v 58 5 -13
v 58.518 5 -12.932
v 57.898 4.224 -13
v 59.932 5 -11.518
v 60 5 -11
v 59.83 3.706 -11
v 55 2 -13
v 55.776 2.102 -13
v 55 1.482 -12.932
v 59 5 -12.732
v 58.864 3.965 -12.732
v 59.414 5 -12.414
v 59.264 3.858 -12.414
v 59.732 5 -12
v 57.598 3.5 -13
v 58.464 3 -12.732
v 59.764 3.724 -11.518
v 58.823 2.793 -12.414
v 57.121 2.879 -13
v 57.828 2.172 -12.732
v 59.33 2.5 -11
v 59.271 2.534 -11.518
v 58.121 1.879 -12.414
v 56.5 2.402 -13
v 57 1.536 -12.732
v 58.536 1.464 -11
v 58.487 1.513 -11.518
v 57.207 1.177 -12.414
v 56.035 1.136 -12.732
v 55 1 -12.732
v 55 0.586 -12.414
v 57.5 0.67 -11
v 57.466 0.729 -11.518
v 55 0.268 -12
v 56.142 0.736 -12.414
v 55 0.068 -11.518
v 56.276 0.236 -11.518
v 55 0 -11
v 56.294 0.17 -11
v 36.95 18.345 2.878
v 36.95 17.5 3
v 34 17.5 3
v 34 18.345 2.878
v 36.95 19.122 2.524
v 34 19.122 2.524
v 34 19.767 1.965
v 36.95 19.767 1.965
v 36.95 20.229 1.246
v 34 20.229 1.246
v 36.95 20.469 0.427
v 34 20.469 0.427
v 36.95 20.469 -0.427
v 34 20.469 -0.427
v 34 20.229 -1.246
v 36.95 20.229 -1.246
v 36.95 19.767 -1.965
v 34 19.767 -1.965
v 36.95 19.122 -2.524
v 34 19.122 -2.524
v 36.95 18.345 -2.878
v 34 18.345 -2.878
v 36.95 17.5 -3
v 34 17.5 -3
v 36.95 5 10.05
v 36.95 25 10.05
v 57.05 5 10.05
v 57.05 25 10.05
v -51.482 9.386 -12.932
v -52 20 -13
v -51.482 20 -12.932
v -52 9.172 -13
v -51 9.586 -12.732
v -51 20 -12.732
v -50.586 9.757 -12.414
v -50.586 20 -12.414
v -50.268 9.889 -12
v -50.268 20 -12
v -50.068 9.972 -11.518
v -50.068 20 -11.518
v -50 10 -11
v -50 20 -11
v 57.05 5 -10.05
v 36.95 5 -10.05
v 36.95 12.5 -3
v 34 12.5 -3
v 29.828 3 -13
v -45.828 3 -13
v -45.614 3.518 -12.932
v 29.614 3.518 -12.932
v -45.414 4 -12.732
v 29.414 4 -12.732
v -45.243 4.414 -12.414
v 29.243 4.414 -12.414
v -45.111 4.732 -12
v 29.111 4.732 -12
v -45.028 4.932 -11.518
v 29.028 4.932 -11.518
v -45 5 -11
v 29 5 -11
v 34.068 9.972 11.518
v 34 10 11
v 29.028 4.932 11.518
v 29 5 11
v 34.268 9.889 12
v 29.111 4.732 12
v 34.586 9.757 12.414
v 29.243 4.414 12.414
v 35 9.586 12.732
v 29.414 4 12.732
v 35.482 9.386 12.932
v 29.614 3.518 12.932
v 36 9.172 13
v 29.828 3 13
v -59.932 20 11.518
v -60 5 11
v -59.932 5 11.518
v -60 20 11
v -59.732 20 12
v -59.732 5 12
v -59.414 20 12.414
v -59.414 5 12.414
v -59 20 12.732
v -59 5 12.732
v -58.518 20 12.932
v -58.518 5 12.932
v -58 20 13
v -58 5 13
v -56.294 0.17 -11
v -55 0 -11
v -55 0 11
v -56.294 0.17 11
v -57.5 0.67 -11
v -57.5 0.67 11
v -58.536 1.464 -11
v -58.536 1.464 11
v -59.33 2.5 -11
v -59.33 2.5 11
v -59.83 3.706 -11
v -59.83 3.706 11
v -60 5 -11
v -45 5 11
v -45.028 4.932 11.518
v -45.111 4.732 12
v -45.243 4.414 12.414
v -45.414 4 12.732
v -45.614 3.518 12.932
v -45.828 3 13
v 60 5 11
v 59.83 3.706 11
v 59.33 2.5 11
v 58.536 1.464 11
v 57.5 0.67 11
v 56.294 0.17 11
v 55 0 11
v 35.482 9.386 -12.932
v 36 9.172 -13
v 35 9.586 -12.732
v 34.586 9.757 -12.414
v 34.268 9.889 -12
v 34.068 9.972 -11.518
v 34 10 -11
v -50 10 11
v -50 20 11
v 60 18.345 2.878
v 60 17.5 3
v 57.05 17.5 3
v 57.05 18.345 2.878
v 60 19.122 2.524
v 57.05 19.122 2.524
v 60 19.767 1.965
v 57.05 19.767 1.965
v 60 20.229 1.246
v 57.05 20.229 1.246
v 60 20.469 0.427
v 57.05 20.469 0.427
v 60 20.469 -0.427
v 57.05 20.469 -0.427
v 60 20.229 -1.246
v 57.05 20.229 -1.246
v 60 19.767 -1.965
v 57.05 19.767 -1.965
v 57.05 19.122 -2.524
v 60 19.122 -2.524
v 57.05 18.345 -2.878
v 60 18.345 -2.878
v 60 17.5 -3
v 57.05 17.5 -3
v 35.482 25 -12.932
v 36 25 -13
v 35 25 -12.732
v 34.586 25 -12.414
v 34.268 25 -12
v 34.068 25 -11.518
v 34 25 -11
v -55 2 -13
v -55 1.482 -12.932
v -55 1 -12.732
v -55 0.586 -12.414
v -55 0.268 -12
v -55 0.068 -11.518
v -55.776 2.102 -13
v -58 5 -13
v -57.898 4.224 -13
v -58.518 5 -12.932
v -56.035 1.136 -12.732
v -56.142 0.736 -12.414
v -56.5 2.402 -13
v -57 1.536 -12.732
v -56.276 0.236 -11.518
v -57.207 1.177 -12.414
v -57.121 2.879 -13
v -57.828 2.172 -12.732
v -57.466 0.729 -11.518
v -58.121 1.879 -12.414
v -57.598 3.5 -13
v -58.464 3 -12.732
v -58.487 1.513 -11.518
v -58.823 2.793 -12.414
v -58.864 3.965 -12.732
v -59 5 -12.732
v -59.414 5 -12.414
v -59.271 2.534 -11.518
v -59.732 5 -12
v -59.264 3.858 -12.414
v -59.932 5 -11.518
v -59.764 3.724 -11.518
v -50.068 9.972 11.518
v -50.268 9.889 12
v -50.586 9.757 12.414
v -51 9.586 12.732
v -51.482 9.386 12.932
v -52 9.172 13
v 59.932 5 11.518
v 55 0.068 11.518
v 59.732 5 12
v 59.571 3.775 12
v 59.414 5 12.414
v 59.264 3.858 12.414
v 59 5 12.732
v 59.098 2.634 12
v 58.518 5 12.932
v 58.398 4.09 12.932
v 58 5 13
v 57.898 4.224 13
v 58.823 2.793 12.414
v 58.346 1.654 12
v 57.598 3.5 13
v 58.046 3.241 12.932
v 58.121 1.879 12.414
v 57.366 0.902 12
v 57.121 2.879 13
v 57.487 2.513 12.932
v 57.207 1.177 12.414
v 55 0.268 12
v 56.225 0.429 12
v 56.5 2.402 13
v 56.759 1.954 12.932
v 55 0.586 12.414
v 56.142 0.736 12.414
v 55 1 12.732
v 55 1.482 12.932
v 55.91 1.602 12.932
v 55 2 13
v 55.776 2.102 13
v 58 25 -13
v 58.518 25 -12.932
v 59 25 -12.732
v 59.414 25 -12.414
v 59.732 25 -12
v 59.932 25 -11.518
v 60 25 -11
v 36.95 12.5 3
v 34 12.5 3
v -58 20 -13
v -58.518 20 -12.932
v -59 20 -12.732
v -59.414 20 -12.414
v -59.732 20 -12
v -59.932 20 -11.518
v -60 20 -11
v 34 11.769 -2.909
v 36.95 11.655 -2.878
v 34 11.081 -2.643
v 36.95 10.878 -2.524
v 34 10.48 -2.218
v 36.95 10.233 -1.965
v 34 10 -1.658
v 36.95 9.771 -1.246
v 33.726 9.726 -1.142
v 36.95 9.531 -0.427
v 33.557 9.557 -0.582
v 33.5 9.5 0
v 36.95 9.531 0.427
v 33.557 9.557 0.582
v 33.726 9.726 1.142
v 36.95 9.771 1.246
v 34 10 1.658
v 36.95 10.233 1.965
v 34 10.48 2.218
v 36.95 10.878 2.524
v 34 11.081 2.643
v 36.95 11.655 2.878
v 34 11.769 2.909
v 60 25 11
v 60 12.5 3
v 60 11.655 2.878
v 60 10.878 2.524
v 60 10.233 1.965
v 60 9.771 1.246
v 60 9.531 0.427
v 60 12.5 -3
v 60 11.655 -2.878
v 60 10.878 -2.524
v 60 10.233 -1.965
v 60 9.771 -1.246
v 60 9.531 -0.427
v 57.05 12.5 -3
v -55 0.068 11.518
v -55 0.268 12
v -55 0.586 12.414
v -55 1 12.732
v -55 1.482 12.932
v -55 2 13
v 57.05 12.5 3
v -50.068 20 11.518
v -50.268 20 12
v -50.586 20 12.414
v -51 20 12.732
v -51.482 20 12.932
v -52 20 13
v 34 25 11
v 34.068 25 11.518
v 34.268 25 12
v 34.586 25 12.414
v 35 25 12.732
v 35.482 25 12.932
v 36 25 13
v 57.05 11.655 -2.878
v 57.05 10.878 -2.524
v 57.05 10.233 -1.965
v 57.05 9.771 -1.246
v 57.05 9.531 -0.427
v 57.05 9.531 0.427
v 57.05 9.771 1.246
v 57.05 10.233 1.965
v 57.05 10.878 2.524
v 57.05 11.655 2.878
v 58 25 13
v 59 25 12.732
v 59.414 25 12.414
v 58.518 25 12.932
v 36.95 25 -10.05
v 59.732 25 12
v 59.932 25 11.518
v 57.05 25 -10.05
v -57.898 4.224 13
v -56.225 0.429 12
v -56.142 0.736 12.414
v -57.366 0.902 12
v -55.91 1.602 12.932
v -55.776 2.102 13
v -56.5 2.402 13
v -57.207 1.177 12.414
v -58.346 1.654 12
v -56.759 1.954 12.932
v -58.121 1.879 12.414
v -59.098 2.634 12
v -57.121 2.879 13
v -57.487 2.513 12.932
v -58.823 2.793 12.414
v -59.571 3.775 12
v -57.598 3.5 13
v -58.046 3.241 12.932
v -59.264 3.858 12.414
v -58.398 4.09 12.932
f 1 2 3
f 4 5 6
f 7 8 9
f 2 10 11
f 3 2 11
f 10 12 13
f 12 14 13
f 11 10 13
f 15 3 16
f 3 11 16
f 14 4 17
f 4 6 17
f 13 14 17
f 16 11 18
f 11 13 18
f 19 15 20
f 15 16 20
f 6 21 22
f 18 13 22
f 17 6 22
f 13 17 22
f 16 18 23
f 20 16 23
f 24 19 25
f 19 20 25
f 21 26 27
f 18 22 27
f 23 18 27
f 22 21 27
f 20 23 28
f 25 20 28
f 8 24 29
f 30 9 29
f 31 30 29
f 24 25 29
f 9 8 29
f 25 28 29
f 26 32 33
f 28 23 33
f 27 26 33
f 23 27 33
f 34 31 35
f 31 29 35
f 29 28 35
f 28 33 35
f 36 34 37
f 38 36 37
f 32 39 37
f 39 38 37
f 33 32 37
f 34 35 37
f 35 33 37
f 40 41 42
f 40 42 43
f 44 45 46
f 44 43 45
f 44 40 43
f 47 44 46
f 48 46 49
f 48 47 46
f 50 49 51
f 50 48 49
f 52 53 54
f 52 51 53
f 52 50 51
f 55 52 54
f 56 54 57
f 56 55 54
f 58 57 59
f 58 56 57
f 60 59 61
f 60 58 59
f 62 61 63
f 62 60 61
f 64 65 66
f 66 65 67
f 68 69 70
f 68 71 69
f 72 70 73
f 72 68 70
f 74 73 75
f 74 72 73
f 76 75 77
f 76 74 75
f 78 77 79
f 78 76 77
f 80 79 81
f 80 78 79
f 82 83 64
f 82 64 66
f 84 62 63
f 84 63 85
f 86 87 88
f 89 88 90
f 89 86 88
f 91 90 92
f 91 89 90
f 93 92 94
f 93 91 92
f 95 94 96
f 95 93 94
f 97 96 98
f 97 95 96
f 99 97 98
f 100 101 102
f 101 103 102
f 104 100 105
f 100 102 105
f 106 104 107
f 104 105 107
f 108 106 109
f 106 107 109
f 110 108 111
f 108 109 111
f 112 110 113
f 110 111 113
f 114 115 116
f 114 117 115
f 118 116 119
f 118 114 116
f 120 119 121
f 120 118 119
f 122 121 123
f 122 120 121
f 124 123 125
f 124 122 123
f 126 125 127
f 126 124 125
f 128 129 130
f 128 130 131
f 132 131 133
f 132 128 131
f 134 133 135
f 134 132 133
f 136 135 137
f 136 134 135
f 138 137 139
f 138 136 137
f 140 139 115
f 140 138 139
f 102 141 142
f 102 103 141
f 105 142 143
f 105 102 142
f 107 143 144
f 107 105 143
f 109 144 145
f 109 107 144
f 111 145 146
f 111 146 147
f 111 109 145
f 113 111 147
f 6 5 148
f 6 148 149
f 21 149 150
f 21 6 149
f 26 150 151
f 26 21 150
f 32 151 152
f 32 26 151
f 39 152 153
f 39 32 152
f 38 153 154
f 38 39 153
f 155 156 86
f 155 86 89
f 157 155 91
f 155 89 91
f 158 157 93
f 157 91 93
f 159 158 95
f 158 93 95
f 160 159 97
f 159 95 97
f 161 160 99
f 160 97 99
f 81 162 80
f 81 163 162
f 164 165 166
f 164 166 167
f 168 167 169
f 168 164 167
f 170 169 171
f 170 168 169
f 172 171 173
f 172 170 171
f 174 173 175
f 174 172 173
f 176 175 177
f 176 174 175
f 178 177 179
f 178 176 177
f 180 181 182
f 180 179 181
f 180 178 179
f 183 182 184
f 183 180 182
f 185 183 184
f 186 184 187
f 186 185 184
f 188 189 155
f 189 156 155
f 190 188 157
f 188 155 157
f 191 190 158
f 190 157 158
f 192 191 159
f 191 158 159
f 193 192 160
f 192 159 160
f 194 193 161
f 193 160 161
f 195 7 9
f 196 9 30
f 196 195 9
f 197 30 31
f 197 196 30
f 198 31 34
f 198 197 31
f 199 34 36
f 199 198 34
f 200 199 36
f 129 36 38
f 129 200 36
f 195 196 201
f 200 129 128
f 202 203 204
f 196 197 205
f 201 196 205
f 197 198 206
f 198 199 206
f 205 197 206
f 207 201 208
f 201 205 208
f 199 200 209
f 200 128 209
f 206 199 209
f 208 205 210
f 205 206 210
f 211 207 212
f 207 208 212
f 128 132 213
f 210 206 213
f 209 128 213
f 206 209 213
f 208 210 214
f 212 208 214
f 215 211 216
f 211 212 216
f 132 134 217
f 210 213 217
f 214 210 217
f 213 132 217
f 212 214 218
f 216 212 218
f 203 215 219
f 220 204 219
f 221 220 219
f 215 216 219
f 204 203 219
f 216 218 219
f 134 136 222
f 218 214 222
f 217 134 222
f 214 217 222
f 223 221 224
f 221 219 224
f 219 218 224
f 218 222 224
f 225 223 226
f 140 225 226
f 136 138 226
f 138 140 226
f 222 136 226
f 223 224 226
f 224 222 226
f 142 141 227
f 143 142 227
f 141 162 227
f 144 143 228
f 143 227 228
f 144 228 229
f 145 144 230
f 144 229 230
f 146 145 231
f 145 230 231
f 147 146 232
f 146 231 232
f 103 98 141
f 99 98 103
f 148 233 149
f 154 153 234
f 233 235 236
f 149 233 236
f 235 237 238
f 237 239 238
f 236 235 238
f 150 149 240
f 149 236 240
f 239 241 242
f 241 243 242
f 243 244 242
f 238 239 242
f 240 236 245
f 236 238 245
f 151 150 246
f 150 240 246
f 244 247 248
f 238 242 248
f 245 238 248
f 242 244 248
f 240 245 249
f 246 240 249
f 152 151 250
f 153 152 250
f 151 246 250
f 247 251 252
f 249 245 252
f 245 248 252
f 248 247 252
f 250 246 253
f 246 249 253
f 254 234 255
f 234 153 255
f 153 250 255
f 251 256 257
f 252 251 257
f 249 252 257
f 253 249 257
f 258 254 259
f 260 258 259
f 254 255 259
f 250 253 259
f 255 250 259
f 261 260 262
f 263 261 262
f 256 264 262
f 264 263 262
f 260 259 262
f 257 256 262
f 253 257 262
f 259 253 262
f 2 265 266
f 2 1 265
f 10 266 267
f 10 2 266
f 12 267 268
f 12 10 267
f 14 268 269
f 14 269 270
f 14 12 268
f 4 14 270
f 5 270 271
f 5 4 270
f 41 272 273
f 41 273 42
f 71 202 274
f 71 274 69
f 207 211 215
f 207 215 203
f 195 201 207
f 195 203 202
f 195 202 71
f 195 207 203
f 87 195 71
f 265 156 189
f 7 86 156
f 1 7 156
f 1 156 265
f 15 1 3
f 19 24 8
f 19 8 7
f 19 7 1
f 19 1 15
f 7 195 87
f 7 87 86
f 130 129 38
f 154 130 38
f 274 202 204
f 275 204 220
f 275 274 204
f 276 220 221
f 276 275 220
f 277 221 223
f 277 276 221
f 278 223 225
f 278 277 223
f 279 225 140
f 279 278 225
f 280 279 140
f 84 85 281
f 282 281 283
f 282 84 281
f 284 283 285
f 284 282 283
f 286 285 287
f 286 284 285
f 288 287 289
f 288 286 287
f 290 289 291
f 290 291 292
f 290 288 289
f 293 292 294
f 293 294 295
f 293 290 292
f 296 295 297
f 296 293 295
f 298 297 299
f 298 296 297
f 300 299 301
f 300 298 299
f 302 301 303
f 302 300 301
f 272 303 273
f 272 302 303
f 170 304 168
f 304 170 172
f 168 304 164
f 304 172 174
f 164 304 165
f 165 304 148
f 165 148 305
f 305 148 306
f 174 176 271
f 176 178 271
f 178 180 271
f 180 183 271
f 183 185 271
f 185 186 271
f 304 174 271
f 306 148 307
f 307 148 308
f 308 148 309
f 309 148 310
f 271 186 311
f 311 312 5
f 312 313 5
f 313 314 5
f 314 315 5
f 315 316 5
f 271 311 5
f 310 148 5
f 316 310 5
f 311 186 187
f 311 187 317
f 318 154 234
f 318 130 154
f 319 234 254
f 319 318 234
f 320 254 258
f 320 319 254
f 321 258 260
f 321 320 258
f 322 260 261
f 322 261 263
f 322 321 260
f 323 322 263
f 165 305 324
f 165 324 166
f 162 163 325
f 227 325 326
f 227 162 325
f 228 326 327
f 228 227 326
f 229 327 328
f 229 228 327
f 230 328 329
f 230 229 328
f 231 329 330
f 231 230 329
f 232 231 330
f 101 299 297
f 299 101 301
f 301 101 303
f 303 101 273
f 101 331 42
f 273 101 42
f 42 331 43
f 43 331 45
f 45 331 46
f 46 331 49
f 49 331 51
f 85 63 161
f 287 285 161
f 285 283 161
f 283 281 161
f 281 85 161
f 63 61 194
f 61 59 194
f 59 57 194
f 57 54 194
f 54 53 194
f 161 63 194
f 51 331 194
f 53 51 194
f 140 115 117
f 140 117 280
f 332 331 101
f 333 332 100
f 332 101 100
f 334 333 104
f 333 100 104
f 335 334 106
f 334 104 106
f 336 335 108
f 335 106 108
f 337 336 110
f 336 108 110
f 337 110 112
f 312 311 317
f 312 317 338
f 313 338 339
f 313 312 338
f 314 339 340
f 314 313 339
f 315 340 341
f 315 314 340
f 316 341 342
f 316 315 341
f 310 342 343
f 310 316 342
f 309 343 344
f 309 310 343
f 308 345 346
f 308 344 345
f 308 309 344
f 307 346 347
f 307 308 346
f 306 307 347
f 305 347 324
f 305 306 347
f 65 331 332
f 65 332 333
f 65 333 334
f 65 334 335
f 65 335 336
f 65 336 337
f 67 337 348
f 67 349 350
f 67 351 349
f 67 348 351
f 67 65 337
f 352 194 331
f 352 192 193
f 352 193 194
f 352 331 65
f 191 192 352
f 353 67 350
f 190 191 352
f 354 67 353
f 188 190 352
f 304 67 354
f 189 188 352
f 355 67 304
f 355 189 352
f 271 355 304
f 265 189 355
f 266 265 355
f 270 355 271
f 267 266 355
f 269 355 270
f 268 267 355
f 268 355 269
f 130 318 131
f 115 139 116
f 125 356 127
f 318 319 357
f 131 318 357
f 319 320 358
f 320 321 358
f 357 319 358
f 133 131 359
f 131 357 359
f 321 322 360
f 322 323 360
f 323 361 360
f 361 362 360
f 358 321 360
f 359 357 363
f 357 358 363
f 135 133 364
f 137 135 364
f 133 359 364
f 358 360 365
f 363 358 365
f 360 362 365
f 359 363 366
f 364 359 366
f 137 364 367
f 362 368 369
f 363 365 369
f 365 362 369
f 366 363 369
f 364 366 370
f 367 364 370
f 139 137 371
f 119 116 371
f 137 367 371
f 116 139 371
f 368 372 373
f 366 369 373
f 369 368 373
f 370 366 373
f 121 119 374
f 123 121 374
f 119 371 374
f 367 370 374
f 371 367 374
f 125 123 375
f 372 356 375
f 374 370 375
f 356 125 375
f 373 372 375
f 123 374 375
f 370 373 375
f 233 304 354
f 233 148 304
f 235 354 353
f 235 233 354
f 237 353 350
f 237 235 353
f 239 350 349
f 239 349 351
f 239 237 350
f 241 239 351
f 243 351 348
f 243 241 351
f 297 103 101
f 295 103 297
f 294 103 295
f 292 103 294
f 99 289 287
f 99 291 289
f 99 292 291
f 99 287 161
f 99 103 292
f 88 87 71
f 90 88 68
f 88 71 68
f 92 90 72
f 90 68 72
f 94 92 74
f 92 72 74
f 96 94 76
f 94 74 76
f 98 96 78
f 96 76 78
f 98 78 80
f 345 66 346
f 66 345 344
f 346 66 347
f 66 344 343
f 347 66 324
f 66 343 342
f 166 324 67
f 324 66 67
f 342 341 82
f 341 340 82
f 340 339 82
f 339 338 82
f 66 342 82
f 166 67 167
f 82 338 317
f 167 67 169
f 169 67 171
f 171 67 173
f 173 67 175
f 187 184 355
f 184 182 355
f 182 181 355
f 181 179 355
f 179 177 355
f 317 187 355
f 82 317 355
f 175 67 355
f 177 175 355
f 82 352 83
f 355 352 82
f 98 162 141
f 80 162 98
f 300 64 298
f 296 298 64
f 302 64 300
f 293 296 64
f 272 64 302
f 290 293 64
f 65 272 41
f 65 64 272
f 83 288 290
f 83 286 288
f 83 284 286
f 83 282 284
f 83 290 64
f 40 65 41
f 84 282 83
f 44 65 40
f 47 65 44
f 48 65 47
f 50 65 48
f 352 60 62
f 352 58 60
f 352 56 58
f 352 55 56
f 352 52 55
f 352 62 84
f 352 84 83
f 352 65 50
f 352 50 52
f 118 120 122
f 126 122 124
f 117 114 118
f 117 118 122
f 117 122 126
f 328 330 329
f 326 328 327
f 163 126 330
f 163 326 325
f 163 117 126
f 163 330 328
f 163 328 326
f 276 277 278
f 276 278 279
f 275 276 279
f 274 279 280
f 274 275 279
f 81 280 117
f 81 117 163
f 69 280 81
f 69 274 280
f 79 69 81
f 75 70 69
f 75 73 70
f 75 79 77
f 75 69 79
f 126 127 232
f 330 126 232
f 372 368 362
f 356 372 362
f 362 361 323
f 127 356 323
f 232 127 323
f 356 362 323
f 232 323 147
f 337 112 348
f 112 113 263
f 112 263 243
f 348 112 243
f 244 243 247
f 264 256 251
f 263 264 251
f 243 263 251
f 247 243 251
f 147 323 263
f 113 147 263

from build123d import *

# Parameters (mm, degrees)
SKETCH1_W           = 120
SKETCH1_H           = 26
BOSS_EXTRUDE1_DEPTH = 25
SKETCH3_W           = 84
SKETCH3_H           = 26
CUT_EXTRUDE1_DEPTH  = 20
SKETCH4_W           = 10
SKETCH4_H           = 26
CUT_EXTRUDE2_DEPTH  = 5
CHAMFER1_SIZE       = 5
SKETCH5_W           = 20.1
SKETCH5_H           = 20.1
CUT_EXTRUDE3_DEPTH  = 20
FILLET1_R           = 5
FILLET2_R           = 2
CUT_EXTRUDE4_DEPTH  = 30


with BuildPart() as part:
    # Sketch1 → Boss-Extrude1 (new body)
    with BuildSketch(Plane(origin=(0, 0, 0), x_dir=(1, 0, 0), z_dir=(0, 1, 0))):
        Rectangle(SKETCH1_W, SKETCH1_H)
    extrude(amount=BOSS_EXTRUDE1_DEPTH)

    # Sketch3 → Cut-Extrude1 (cut)
    with BuildSketch(Plane(origin=(0, 25, 0), x_dir=(1, 0, 0), z_dir=(0, 1, 0))):
        with Locations((-8, 0)):
            Rectangle(SKETCH3_W, SKETCH3_H)
    extrude(amount=-CUT_EXTRUDE1_DEPTH, mode=Mode.SUBTRACT)

    # Sketch4 → Cut-Extrude2 (cut)
    with BuildSketch(Plane(origin=(0, 25, 0), x_dir=(1, 0, 0), z_dir=(0, 1, 0))):
        with Locations((-55, 0)):
            Rectangle(SKETCH4_W, SKETCH4_H)
    extrude(amount=-CUT_EXTRUDE2_DEPTH, mode=Mode.SUBTRACT)

    # Chamfer1
    chamfer1_edges = [part.edges().sort_by_distance(p)[0] for p in [
        (-50, 5, 0),
        (34, 5, 0),
    ]]
    chamfer(chamfer1_edges, length=CHAMFER1_SIZE)

    # Sketch5 → Cut-Extrude3 (cut)
    with BuildSketch(Plane(origin=(0, 25, 0), x_dir=(1, 0, 0), z_dir=(0, 1, 0))):
        with Locations((47, 0)):
            Rectangle(SKETCH5_W, SKETCH5_H)
    extrude(amount=-CUT_EXTRUDE3_DEPTH, mode=Mode.SUBTRACT)

    # Fillet1
    fillet1_edges = [part.edges().sort_by_distance(p)[0] for p in [
        (60, 0, 0),
        (-60, 0, 0),
    ]]
    fillet(fillet1_edges, radius=FILLET1_R)

    # Fillet2
    fillet2_edges = [part.edges().sort_by_distance(p)[0] for p in [
        (-60, 12.5, -13),
        (-60, 12.5, 13),
        (-8, 5, 13),
        (-8, 5, -13),
        (-50, 15, 13),
        (-50, 15, -13),
        (34, 17.5, -13),
        (34, 17.5, 13),
        (-47.5, 7.5, 13),
        (-47.5, 7.5, -13),
        (31.5, 7.5, -13),
        (31.5, 7.5, 13),
        (0, 0, -13),
        (-58.535533906, 1.464466094, -13),
        (58.535533906, 1.464466094, -13),
        (0, 0, 13),
        (-58.535533906, 1.464466094, 13),
        (58.535533906, 1.464466094, 13),
        (60, 15, -13),
        (60, 15, 13),
    ]]
    fillet(fillet2_edges, radius=FILLET2_R)

    # Sketch6 → Cut-Extrude4 (cut)
    with BuildSketch(Plane(origin=(60, 0, 0), x_dir=(0, 0, -1), z_dir=(1, 0, 0))):
        with BuildLine():
            Line((3, 17.5), (3, 12.5))
            ThreePointArc((3, 12.5), (0, 9.5), (-3, 12.5))
            Line((-3, 12.5), (-3, 17.5))
            ThreePointArc((-3, 17.5), (0, 20.5), (3, 17.5))
        make_face()
    extrude(amount=-CUT_EXTRUDE4_DEPTH, mode=Mode.SUBTRACT)


solid = part.part
